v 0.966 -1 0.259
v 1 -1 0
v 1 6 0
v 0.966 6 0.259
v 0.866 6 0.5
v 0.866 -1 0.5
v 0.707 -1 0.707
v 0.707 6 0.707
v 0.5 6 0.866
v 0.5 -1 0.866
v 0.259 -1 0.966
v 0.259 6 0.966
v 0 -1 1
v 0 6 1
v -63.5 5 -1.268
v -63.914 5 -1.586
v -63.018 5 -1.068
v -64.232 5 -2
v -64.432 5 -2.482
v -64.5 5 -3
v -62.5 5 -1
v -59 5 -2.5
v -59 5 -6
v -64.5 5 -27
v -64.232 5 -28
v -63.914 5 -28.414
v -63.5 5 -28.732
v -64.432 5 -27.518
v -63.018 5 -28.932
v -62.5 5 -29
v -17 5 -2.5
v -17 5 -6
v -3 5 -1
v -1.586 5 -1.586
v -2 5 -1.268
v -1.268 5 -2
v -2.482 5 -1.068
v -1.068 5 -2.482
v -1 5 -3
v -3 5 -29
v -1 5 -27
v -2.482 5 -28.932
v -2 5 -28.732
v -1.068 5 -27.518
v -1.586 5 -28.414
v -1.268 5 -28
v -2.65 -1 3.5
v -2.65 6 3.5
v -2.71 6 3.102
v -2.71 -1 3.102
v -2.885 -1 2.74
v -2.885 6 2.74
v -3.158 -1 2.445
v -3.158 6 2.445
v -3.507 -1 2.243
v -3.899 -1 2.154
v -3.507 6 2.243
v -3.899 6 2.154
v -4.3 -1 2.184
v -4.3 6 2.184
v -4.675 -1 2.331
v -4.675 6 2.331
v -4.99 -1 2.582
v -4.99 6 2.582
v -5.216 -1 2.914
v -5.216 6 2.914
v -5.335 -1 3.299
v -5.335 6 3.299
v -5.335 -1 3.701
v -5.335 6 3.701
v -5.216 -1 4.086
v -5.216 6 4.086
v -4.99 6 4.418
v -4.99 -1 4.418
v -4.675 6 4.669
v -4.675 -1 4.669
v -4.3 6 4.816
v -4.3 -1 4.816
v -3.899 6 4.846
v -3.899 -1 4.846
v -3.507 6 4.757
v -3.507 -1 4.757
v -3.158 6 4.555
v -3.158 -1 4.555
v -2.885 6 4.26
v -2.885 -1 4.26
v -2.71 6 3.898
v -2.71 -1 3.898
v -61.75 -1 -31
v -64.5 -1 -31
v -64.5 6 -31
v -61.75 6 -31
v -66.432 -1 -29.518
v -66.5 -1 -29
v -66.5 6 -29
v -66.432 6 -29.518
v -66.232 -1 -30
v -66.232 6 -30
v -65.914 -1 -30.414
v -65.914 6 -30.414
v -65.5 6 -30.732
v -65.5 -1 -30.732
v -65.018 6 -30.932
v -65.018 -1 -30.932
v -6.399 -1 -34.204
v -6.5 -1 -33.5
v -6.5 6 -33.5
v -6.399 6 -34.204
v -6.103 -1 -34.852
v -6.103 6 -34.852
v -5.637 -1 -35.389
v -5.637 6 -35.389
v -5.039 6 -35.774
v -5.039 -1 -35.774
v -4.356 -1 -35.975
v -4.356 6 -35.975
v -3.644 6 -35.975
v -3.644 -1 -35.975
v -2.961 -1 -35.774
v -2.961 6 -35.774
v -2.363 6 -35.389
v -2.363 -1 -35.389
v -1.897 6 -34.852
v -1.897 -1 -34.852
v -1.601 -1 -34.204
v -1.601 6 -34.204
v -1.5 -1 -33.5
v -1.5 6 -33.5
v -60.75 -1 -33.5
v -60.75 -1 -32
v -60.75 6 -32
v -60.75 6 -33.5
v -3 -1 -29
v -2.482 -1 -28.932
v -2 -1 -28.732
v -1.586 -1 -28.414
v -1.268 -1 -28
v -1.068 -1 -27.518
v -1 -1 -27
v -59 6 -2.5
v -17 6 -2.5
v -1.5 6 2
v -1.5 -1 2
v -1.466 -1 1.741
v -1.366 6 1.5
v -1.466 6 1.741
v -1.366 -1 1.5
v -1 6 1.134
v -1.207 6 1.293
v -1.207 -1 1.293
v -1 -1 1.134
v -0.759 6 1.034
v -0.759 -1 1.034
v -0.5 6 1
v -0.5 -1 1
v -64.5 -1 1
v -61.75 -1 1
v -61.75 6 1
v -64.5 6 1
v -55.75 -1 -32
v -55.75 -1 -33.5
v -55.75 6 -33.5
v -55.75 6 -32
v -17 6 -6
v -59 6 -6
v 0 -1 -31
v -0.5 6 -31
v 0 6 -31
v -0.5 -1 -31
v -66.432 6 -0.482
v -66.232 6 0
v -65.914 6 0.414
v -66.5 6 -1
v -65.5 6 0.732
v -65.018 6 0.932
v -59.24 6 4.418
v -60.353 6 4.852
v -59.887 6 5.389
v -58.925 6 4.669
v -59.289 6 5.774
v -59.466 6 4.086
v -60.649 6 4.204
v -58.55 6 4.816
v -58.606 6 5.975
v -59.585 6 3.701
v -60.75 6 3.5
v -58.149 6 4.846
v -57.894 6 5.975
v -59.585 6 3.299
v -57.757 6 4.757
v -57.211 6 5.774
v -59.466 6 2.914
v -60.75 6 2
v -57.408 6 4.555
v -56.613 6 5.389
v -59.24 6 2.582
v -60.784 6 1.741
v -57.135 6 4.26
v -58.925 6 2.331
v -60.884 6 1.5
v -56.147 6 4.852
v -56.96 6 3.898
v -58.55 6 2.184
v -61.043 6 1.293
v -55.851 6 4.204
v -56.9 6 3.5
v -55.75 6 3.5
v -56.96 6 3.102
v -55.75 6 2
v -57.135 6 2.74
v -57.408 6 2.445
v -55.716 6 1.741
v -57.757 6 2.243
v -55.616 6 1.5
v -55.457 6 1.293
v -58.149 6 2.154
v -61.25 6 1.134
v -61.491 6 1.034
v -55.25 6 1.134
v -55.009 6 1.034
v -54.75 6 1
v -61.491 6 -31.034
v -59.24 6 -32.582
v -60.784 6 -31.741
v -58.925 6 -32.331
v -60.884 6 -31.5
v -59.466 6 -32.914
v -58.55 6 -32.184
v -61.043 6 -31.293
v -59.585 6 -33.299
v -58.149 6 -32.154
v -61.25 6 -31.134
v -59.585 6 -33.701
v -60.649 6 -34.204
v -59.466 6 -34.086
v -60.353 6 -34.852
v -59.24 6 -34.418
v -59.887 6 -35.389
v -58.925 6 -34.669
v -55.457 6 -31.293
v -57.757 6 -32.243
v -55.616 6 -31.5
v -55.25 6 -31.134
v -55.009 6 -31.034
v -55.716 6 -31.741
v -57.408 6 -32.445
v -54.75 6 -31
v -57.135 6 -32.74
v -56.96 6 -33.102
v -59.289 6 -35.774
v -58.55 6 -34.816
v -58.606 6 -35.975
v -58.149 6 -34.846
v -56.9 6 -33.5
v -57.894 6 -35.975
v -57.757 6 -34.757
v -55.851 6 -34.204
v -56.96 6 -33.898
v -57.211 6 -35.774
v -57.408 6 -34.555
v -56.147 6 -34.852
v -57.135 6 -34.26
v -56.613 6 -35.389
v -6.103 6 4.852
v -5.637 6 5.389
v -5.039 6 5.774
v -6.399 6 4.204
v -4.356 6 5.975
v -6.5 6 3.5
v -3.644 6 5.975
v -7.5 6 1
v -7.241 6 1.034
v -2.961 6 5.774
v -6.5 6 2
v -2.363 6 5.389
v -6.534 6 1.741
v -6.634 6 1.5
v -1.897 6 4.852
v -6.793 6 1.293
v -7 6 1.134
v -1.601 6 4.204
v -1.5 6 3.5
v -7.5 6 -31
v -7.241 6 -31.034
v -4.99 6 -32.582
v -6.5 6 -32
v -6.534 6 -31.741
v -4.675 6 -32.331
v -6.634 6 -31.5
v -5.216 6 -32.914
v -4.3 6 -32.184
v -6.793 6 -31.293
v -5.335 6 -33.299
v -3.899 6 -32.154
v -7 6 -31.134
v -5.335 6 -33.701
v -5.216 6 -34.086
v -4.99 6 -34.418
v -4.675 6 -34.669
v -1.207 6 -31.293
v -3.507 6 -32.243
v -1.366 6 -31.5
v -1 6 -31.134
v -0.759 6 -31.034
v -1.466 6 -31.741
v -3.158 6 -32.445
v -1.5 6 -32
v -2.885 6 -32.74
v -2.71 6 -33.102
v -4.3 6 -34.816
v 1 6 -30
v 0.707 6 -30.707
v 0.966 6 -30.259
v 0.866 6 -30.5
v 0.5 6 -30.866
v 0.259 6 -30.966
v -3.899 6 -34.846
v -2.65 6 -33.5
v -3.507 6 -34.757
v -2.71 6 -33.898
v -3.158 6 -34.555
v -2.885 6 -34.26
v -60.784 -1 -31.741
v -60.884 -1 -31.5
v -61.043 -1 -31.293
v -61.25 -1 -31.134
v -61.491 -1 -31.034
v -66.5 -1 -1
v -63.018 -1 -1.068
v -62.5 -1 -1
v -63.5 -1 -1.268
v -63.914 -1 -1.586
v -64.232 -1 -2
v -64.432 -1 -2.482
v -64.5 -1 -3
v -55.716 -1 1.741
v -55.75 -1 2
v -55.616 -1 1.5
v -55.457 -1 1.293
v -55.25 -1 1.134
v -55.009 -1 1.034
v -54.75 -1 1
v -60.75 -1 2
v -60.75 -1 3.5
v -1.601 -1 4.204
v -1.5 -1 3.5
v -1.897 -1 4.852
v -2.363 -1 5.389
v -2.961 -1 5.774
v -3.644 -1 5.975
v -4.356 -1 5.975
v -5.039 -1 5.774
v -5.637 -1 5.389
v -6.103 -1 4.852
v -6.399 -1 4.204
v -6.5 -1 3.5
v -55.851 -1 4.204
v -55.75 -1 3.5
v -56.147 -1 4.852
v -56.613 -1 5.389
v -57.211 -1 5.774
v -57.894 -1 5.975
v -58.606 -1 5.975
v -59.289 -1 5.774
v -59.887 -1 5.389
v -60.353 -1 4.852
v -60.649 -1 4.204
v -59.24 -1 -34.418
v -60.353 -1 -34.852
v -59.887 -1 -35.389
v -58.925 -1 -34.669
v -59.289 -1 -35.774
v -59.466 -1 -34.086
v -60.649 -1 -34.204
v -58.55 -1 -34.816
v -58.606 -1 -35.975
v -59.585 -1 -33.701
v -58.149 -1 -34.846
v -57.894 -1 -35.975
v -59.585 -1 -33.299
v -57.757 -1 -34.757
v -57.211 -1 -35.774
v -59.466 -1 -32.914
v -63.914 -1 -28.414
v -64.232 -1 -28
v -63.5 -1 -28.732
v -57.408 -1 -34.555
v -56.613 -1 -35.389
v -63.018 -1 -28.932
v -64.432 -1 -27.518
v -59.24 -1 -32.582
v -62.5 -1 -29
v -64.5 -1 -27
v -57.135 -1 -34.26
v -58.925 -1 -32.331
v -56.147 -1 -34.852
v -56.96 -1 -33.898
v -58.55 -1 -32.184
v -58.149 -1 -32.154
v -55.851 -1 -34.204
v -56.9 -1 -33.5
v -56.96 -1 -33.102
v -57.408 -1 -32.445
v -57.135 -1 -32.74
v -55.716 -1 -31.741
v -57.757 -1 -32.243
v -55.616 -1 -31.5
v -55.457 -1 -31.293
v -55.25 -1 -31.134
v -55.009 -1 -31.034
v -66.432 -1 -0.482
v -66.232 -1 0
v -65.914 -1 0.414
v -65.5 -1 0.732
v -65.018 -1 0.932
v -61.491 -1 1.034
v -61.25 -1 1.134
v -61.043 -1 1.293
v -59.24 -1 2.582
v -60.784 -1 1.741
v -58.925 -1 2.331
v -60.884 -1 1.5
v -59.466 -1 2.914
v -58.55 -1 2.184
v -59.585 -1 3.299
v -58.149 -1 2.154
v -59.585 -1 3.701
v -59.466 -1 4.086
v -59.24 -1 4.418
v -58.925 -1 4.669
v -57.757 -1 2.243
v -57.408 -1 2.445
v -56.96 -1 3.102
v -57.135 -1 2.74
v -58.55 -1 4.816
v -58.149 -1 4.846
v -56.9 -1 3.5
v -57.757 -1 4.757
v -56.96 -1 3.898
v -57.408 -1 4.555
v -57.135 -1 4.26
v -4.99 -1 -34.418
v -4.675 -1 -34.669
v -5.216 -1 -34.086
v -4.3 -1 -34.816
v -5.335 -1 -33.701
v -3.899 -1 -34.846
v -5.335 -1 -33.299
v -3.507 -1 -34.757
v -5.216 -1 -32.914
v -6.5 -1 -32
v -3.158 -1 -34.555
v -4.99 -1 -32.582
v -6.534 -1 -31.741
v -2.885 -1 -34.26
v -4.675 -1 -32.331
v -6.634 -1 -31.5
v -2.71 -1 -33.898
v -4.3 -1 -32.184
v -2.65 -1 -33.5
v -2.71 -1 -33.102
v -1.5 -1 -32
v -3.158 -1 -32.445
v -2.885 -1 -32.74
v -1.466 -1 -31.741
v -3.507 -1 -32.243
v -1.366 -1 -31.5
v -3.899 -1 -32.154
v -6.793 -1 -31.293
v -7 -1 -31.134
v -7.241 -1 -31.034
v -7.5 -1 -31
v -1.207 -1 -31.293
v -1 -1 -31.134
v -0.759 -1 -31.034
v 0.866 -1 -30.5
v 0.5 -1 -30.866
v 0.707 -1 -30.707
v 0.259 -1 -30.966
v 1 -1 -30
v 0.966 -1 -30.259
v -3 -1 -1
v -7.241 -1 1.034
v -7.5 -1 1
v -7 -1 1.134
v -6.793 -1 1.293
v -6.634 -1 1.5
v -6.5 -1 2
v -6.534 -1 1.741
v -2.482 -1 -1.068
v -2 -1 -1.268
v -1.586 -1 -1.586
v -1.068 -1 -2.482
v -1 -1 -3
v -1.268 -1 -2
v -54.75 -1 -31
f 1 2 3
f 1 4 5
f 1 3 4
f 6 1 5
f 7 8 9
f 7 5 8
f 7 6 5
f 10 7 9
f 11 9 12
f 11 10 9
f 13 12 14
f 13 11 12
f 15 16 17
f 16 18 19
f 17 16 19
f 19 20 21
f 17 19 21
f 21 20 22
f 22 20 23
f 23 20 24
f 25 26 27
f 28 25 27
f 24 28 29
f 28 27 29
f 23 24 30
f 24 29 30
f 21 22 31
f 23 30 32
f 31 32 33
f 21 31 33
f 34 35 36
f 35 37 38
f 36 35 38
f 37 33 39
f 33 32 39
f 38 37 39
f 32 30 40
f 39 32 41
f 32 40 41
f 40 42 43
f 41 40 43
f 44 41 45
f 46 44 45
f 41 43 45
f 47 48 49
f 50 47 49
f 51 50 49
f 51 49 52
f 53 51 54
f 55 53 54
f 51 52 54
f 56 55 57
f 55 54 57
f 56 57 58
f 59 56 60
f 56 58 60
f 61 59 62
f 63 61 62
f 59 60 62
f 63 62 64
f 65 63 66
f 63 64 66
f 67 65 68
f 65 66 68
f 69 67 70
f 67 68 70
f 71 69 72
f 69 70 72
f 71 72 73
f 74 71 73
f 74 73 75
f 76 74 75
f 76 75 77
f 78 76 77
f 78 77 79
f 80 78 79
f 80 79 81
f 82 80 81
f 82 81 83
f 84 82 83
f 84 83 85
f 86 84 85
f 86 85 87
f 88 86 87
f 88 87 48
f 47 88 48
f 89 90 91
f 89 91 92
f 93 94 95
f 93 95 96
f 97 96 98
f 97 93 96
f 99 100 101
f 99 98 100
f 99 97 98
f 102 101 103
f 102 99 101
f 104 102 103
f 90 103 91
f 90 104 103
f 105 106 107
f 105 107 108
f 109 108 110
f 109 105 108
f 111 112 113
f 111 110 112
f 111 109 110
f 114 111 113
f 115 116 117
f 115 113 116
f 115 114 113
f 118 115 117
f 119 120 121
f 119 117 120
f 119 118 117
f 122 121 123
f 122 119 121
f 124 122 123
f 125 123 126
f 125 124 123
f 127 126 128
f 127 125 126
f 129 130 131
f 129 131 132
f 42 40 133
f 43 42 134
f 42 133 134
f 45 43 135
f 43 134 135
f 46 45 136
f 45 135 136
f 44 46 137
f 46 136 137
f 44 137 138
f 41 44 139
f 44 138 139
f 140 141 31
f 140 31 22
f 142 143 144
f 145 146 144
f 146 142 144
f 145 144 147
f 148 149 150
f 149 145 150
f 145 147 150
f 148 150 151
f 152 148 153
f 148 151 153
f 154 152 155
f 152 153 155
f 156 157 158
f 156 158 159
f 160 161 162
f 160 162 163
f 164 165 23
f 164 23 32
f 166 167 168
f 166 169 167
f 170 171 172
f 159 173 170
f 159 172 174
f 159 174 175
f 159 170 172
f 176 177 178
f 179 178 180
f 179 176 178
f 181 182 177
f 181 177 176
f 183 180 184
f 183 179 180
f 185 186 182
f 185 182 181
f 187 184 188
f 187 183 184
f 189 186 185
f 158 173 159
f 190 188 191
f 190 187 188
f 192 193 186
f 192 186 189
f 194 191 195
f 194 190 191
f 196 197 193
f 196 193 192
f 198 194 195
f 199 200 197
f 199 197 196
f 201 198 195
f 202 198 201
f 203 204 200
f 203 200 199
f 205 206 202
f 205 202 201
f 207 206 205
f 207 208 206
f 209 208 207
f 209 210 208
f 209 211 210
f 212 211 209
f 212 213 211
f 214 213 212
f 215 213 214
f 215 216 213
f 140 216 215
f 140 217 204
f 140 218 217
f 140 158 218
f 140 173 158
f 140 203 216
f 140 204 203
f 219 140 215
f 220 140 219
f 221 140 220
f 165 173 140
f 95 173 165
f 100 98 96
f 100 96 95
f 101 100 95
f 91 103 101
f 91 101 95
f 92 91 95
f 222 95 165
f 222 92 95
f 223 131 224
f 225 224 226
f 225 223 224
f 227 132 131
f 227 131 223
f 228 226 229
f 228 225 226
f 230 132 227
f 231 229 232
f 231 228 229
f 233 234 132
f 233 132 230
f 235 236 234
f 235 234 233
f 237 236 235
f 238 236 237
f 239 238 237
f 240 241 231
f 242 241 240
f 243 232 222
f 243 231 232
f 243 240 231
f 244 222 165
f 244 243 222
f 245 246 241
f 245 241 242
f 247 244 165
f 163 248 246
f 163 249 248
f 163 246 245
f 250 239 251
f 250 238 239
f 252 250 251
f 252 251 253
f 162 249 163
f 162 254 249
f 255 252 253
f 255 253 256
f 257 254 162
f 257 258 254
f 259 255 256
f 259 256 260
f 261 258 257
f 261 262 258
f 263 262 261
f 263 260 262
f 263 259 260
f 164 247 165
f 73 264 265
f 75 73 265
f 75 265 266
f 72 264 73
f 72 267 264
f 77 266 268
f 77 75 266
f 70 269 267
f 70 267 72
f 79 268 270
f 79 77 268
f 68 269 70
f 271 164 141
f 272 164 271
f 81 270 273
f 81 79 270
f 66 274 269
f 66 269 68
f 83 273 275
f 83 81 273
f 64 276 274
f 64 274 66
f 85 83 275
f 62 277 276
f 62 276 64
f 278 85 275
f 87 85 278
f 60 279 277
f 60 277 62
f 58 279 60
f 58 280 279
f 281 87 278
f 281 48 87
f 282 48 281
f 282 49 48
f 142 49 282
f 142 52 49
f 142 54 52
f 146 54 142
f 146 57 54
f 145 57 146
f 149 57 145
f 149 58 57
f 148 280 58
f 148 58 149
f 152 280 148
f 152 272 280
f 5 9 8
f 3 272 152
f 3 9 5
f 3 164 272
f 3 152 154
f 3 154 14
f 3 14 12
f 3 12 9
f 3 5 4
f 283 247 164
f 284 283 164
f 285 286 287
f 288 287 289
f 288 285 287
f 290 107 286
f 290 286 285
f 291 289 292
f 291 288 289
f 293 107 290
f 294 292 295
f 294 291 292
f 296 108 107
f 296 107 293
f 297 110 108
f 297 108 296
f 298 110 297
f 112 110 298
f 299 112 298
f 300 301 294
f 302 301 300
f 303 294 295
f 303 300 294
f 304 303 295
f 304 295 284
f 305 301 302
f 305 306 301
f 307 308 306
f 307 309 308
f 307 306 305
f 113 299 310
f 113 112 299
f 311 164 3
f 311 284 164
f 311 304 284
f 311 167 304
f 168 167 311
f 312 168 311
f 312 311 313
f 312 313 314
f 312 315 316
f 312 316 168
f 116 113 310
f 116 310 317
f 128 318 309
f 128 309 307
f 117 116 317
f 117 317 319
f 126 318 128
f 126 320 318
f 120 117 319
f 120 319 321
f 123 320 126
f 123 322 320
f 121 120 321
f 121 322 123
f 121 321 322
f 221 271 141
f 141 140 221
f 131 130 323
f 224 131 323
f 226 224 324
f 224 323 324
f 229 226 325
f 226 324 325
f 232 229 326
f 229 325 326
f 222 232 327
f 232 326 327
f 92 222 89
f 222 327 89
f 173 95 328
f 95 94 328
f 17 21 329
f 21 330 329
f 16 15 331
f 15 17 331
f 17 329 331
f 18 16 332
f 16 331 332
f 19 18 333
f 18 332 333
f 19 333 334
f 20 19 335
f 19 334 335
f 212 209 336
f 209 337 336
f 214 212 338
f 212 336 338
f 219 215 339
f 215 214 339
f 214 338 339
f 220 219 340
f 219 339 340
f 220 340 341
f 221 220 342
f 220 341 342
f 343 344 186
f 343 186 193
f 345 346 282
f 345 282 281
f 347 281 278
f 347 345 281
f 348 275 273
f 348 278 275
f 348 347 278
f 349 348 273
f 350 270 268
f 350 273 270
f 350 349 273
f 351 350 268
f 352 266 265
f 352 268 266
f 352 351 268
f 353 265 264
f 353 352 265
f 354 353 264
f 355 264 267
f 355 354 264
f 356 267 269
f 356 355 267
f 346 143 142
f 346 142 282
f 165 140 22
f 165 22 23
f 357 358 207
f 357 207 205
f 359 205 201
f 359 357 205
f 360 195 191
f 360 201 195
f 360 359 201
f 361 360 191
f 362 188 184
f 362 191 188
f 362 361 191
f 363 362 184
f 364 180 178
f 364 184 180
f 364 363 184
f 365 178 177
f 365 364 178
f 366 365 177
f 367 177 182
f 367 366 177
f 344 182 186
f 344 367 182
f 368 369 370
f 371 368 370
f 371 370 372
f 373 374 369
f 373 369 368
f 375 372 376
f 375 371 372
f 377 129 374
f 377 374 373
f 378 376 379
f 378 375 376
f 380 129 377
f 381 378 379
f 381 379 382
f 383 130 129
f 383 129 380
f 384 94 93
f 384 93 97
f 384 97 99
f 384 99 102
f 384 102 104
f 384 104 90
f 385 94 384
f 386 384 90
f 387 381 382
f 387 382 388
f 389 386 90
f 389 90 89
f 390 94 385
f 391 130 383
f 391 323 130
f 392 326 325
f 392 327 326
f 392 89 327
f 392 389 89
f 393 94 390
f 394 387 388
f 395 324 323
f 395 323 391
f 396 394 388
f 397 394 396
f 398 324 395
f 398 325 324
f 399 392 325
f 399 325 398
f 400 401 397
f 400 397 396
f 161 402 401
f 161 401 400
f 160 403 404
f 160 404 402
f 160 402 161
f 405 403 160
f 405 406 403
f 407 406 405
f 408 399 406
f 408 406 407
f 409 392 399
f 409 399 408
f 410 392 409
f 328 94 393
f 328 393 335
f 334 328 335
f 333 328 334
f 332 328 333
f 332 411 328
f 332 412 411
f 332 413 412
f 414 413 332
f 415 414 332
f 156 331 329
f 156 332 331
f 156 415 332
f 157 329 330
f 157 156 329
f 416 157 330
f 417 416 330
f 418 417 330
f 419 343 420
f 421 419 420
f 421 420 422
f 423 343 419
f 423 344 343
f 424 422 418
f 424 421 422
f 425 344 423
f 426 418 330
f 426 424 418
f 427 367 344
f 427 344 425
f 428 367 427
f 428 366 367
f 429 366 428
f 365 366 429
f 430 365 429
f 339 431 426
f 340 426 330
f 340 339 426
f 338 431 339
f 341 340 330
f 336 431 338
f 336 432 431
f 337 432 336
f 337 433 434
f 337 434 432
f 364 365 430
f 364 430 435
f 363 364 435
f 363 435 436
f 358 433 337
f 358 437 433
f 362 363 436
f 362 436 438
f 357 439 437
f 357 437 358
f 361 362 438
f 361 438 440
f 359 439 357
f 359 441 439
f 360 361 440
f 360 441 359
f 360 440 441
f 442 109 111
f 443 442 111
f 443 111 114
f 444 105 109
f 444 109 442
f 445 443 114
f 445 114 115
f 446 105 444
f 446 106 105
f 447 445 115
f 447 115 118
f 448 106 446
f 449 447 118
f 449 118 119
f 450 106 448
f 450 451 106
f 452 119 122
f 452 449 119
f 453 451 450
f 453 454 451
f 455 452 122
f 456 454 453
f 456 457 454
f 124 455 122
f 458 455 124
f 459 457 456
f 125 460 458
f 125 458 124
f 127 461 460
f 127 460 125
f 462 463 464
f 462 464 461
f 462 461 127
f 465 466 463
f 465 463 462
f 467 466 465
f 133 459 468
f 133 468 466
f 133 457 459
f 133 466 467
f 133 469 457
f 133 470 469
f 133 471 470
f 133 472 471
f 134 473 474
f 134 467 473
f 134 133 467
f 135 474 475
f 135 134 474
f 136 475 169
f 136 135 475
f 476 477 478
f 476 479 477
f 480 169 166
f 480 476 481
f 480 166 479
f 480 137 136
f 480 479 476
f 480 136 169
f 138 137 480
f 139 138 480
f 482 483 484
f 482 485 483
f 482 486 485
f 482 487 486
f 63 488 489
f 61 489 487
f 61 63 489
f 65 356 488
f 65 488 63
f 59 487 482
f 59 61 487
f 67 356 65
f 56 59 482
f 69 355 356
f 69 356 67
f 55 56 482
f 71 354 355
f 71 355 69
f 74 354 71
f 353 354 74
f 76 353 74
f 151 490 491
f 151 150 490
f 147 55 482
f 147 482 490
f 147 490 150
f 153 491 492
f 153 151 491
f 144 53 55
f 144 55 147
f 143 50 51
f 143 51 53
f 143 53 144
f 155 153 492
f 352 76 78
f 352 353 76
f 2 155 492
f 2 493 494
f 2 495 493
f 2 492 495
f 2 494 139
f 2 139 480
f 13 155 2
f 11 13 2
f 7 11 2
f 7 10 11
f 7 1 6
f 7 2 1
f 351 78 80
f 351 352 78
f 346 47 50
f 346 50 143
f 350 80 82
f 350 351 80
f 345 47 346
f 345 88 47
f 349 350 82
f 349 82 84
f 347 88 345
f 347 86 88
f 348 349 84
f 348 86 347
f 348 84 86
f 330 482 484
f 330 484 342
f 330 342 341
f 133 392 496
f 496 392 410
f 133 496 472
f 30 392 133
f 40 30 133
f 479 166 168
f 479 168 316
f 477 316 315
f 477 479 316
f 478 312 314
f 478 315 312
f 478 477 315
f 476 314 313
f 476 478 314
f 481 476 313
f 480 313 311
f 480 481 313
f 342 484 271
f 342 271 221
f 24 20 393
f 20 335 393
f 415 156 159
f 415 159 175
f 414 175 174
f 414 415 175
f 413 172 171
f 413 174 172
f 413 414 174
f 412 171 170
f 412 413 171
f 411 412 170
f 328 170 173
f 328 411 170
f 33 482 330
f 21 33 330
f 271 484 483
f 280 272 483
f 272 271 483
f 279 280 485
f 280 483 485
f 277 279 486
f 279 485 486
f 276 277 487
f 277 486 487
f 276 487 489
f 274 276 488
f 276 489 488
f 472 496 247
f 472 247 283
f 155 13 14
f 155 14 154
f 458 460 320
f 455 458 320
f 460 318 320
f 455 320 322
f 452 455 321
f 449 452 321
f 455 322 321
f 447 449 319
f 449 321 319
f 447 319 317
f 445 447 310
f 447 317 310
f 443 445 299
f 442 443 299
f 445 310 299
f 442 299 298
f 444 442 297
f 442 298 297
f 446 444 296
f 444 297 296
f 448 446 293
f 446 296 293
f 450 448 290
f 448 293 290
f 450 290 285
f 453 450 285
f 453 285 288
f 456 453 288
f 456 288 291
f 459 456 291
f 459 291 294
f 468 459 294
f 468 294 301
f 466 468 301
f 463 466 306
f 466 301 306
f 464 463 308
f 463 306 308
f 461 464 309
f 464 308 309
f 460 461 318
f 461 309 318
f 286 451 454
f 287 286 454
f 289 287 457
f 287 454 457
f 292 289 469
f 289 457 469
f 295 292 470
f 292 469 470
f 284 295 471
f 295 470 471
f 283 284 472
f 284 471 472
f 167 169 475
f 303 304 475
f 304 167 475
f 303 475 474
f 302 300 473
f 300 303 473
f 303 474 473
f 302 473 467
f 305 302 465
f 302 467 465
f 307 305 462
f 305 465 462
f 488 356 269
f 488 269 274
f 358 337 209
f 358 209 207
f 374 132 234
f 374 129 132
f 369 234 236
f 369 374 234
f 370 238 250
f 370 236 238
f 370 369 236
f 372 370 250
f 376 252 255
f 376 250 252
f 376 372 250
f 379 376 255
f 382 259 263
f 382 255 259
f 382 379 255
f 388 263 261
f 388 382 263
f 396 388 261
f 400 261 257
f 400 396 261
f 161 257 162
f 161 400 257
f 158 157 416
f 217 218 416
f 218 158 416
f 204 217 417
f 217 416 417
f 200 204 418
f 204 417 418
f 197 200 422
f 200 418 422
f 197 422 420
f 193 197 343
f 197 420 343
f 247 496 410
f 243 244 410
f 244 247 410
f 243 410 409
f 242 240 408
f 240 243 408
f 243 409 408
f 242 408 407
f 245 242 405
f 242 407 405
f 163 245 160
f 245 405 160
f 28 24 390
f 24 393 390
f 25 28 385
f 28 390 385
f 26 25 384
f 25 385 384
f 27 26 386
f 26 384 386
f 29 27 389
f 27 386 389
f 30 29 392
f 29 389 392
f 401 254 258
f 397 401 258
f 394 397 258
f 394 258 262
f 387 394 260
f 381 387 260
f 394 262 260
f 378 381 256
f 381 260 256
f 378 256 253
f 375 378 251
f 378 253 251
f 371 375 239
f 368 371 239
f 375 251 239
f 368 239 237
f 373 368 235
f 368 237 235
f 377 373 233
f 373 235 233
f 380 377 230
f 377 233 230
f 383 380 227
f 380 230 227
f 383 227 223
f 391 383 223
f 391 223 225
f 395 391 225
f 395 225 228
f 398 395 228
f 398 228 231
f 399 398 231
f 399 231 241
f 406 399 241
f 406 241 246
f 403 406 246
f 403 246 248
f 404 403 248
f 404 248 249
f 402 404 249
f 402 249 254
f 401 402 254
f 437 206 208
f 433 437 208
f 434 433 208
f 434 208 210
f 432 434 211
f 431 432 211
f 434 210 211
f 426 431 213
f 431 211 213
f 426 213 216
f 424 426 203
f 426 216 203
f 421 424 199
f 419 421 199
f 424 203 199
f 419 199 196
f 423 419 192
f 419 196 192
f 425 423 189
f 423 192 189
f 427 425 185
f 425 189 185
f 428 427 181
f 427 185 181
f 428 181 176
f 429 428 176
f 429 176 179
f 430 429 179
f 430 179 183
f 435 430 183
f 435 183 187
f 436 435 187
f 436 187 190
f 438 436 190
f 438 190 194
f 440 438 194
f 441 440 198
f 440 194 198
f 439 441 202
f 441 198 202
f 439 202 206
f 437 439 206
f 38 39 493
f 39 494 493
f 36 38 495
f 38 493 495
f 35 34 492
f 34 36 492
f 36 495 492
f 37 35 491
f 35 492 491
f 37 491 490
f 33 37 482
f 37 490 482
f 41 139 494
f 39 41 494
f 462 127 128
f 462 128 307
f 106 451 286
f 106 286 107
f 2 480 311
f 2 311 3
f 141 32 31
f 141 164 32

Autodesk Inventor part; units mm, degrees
ref_plane "YZ Plane" through (0, 0, 0) normal (1, 0, 0) x (0, 1, 0)
ref_plane "XZ Plane" through (0, 0, 0) normal (0, 1, 0) x (-1, 0, 0)
ref_plane "XY Plane" through (0, 0, 0) normal (0, 0, 1) x (1, 0, 0)
sketch "Sketch1" plane through (0, 0, 0) normal (0, 1, 0) x (-1, 0, 0)
  line L0 (0, 0) -> (37, 0) construction
  line L1 (37, 0) -> (37, -30) construction
  line L2 (37, -30) -> (0, -30) construction
  line L3 (0, -30) -> (0, 0) construction
  line L4 (75.5, -6) -> (38, -6) construction
  line L5 (38, -6) -> (38, -24) construction
  line L6 (38, -24) -> (75.5, -24) construction
  line L7 (75.5, -24) -> (75.5, -6) construction
  line L8 (94, 0) -> (76.5, 0) construction
  line L9 (76.5, 0) -> (76.5, -28) construction
  line L10 (76.5, -28) -> (94, -28) construction
  line L11 (94, -28) -> (94, 0) construction
  line L12 (-1, 1) -> (117.5, 1)
  line L13 (117.5, 1) -> (117.5, -31)
  line L14 (117.5, -31) -> (-1, -31)
  line L15 (-1, -31) -> (-1, 1)
  line L16 (0, 0) -> (94, 0)
  line L17 (94, 0) -> (94, -30)
  line L18 (94, -30) -> (0, -30)
  line L19 (0, -30) -> (0, 0)
  line L20 (38, -8) -> (37, -8)
  line L21 (37, -8) -> (37, -22)
  line L22 (37, -22) -> (38, -22)
  line L23 (38, -22) -> (38, -8)
  line L24 (73.5, -6) -> (40, -6)
  line L25 (40, -6) -> (40, -5)
  line L26 (40, -5) -> (73.5, -5)
  line L27 (73.5, -5) -> (73.5, -6)
  line L28 (73.5, -24) -> (40, -24)
  line L29 (40, -24) -> (40, -25)
  line L30 (40, -25) -> (73.5, -25)
  line L31 (73.5, -25) -> (73.5, -24)
  line L32 (76.5, -8) -> (75.5, -8)
  line L33 (75.5, -8) -> (75.5, -22)
  line L34 (75.5, -22) -> (76.5, -22)
  line L35 (76.5, -22) -> (76.5, -8)
  line L36 (115, -31) -> (115, -33.5) construction
  line L37 (58.25, -31) -> (58.25, -33.5) construction
  line L38 (4, -31) -> (4, -33.5) construction
  line L39 (115, 1) -> (115, 3.5) construction
  line L40 (58.25, 1) -> (58.25, 3.5) construction
  line L41 (4, 1) -> (4, 3.5) construction
  circle A0 centre (115, -33.5) radius 2.5
  circle A1 centre (58.25, -33.5) radius 2.5
  circle A2 centre (4, -33.5) radius 2.5
  circle A3 centre (4, 3.5) radius 2.5
  circle A4 centre (58.25, 3.5) radius 2.5
  circle A5 centre (115, 3.5) radius 2.5
  line L42 (117.5, 1) -> (117.5, 3.5)
  line L43 (112.5, 3.5) -> (112.5, 1)
  line L44 (60.75, 3.5) -> (60.75, 1)
  line L45 (55.75, 3.5) -> (55.75, 1)
  line L46 (6.5, 3.5) -> (6.5, 1)
  line L47 (1.5, 3.5) -> (1.5, 1)
  line L48 (1.5, -33.5) -> (1.5, -31)
  line L49 (6.5, -33.5) -> (6.5, -31)
  line L50 (55.75, -33.5) -> (55.75, -31)
  line L51 (60.75, -33.5) -> (60.75, -31)
  line L52 (117.5, -33.5) -> (117.5, -31)
  line L53 (112.5, -33.5) -> (112.5, -31)
  circle A6 centre (115, -33.5) radius 1.55
  circle A7 centre (58.25, -33.5) radius 1.55
  circle A8 centre (4, -33.5) radius 1.55
  circle A9 centre (4, 3.5) radius 1.55
  circle A10 centre (58.25, 3.5) radius 1.55
  circle A11 centre (115, 3.5) radius 1.55
  line L54 (57.75, -30) -> (58.75, -30)
  line L55 (58.75, -30) -> (58.75, -25)
  line L56 (58.75, -25) -> (57.75, -25)
  line L57 (57.75, -25) -> (57.75, -30)
  line L58 (57.75, -5) -> (58.75, -5)
  line L59 (58.75, -5) -> (58.75, 0)
  line L60 (58.75, 0) -> (57.75, 0)
  line L61 (57.75, 0) -> (57.75, -5)
  line L62 (40, -25) -> (41, -25)
  line L63 (41, -25) -> (41, -30)
  line L64 (41, -30) -> (40, -30)
  line L65 (40, -30) -> (40, -25)
  line L66 (40, -5) -> (41, -5)
  line L67 (41, -5) -> (41, 0)
  line L68 (41, 0) -> (40, 0)
  line L69 (40, 0) -> (40, -5)
  line L70 (73.5, -5) -> (72.5, -5)
  line L71 (72.5, -5) -> (72.5, 0)
  line L72 (72.5, 0) -> (73.5, 0)
  line L73 (73.5, 0) -> (73.5, -5)
  line L74 (73.5, -25) -> (72.5, -25)
  line L75 (72.5, -25) -> (72.5, -30)
  line L76 (72.5, -30) -> (73.5, -30)
  line L77 (73.5, -30) -> (73.5, -25)
  dimension "d0" = 37
  dimension "d1" = 30
  dimension "d2" = 18
  dimension "d3" = 37.5
  dimension "d4" = 1
  dimension "d5" = 6
  dimension "d6" = 17.5
  dimension "d7" = 28
  dimension "d8" = 1
  dimension "d9" = 1
  dimension "d10" = 1
  dimension "d11" = 1
  dimension "d12" = 117.5
  dimension "d13" = 2
  dimension "d14" = 2
  dimension "d15" = 1
  dimension "d16" = 1
  dimension "d17" = 2
  dimension "d18" = 2
  dimension "d19" = 2
  dimension "d20" = 2
  dimension "d21" = 2.5
  dimension "d22" = 2.5
  dimension "d23" = 5
  dimension "d24" = 2.5
  dimension "d25" = 2.5
  dimension "d26" = 2.5
  dimension "d27" = 2.5
  dimension "d28" = 5
  dimension "d29" = 5
  dimension "d30" = 2.5
  dimension "d31" = 3.1
  dimension "d32" = 3.1
  dimension "d33" = 3.1
  dimension "d34" = 3.1
  dimension "d35" = 3.1
  dimension "d36" = 3.1
  dimension "d44" = 1
  dimension "d45" = 1
  dimension "d46" = 0.5
  dimension "d47" = 0
  dimension "d48" = 1
  dimension "d49" = 1
  dimension "d50" = 1
  dimension "d51" = 1
extrude "Extrusion1" add sketch "Sketch1" along normal blind 7 contours L12 L13 L14 L15 | L47 A3 L12 | A3 L46 L12 | A3 | L14 A2 L48 | L14 L49 A2 | A2 | L45 A4 L12 | A4 L44 L12 | A4 | L14 A1 L50 | L14 L51 A1 | A1 | L43 A5 L12 | A5 L42 L12 | A5 | L14 A0 L53 | L14 L52 A0 | A0 | L16 L67 L26 L69 | L26 L27 L24 L25 | L65 L30 L63 L18 | L16 L59 L26 L61 | L29 L28 L31 L30 | L57 L30 L55 L18 | L16 L73 L26 L71 | L75 L30 L77 L18 | L23 L22 L21 L20 | L35 L34 L33 L32
sketch "Sketch2" plane through (0, 0, 0) normal (0, -1, 0) x (1, 0, 0)
  line L0 (-117.5, -33.5) -> (-117.5, 3.5) projected
  arc A0 (-117.5, -33.5) -> (-112.5, -33.5) centre (-115, -33.5) ccw projected
  line L1 (-112.5, -31) -> (-112.5, -33.5) projected
  line L2 (-60.75, -31) -> (-112.5, -31) projected
  line L3 (-60.75, -33.5) -> (-60.75, -31) projected
  arc A1 (-60.75, -33.5) -> (-55.75, -33.5) centre (-58.25, -33.5) ccw projected
  line L4 (-55.75, -31) -> (-55.75, -33.5) projected
  line L5 (-6.5, -31) -> (-55.75, -31) projected
  line L6 (-6.5, -33.5) -> (-6.5, -31) projected
  arc A2 (-6.5, -33.5) -> (-1.5, -33.5) centre (-4, -33.5) ccw projected
  line L7 (-1.5, -31) -> (-1.5, -33.5) projected
  line L8 (1, -31) -> (-1.5, -31) projected
  line L9 (1, 1) -> (1, -31) projected
  line L10 (-1.5, 1) -> (1, 1) projected
  line L11 (-1.5, 3.5) -> (-1.5, 1) projected
  arc A3 (-1.5, 3.5) -> (-6.5, 3.5) centre (-4, 3.5) ccw projected
  line L12 (-6.5, 1) -> (-6.5, 3.5) projected
  line L13 (-55.75, 1) -> (-6.5, 1) projected
  line L14 (-55.75, 3.5) -> (-55.75, 1) projected
  arc A4 (-55.75, 3.5) -> (-60.75, 3.5) centre (-58.25, 3.5) ccw projected
  line L15 (-60.75, 1) -> (-60.75, 3.5) projected
  line L16 (-112.5, 1) -> (-60.75, 1) projected
  line L17 (-112.5, 3.5) -> (-112.5, 1) projected
  arc A5 (-112.5, 3.5) -> (-117.5, 3.5) centre (-115, 3.5) ccw projected
  circle A6 centre (-58.25, 3.5) radius 1.55 projected
  circle A7 centre (-4, 3.5) radius 1.55 projected
  circle A8 centre (-4, -33.5) radius 1.55 projected
  circle A9 centre (-58.25, -33.5) radius 1.55 projected
  circle A10 centre (-115, 3.5) radius 1.55 projected
  circle A11 centre (-115, -33.5) radius 1.55 projected
  line L18 (-41, 0) -> (-57.75, 0) projected
  line L19 (0, -30) -> (0, 0) projected
  line L20 (-57.75, -30) -> (-41, -30) projected
  line L21 (-94, 0) -> (-94, -30) projected
  line L22 (-41, -5) -> (-41, 0) projected
  line L23 (-57.75, -5) -> (-41, -5) projected
  line L24 (-57.75, 0) -> (-57.75, -5) projected
  line L25 (-41, -30) -> (-41, -25) projected
  line L26 (-57.75, -25) -> (-57.75, -30) projected
  line L27 (-41, -25) -> (-57.75, -25) projected
  line L28 (-72.5, -25) -> (-72.5, -30) projected
  line L29 (-58.75, -25) -> (-72.5, -25) projected
  line L30 (-58.75, -30) -> (-58.75, -25) projected
  line L31 (-72.5, -30) -> (-58.75, -30) projected
  line L32 (-72.5, 0) -> (-72.5, -5) projected
  line L33 (-58.75, 0) -> (-72.5, 0) projected
  line L34 (-58.75, -5) -> (-58.75, 0) projected
  line L35 (-72.5, -5) -> (-58.75, -5) projected
  line L36 (-73.5, 0) -> (-94, 0) projected
  line L37 (-73.5, -6) -> (-73.5, 0) projected
  line L38 (-40, -6) -> (-73.5, -6) projected
  line L39 (-40, 0) -> (-40, -6) projected
  line L40 (0, 0) -> (-40, 0) projected
  line L41 (-40, -30) -> (0, -30) projected
  line L42 (-40, -24) -> (-40, -30) projected
  line L43 (-73.5, -24) -> (-40, -24) projected
  line L44 (-73.5, -30) -> (-73.5, -24) projected
  line L45 (-94, -30) -> (-73.5, -30) projected
extrude "Extrusion2" add sketch "Sketch2" along normal blind 1 contours L0 A5 L17 L16 L15 A4 L14 L13 L12 A3 L11 L10 L9 L8 L7 A2 L6 L5 L4 A1 L3 L2 L1 A0 | L22 L23 L24 L18 | L41 L42 L43 L44 L45 L21 L36 L37 L38 L39 L40 L19 | L26 L27 L25 L20 | L29 L30 L31 L28 | L33 L34 L35 L32
fillet "Fillet2" radius 1 32 edges at (-73.5, 3.5, -6) (-73.5, 3.5, -24) (-40, 3.5, -24) (1, 3, -31) (-1.5, 3, -31) (1, 3, 1) (-55.75, 3, -31) (-1.5, 3, 1) (-55.75, 3, 1) (-112.5, 3, 1) (-112.5, 3, -31) (-60.75, 3, -31) (-6.5, 3, -31) (-60.75, 3, 1) (-6.5, 3, 1) (-40, 3.5, -6) (-72.5, 3.5, 0) (-57.75, 3.5, 0) (-72.5, 3.5, -25) (-57.75, 3.5, -25) (-41, 3.5, -25) (-58.75, 3.5, -25) (-41, 3.5, 0) (-58.75, 3.5, 0) (-72.5, 3.5, -30) (-57.75, 3.5, -30) (-57.75, 3.5, -5) (-72.5, 3.5, -5) (-41, 3.5, -5) (-58.75, 3.5, -5) (-58.75, 3.5, -30) (-41, 3.5, -30)
sketch "Sketch5" plane through (0, 7, 0) normal (0, 1, 0) x (1, 0, 0)
  line L0 (-120.447, 38.9055) -> (3.6698, 38.9055)
  line L1 (3.6698, 38.9055) -> (3.6698, -10.7705)
  line L2 (3.6698, -10.7705) -> (-120.447, -10.7705)
  line L3 (-120.447, -10.7705) -> (-120.447, 38.9055)
  point P0 (0, 0)
extrude "Extrusion5" cut sketch "Sketch5" against normal blind 7
sketch "Sketch13" plane through (0, 0, 0) normal (0, 1, 0) x (1, 0, 0)
  line L0 (-64.5, 29) -> (-1, 29)
  line L1 (-1, 29) -> (-1, 1)
  line L2 (-1, 1) -> (-64.5, 1)
  line L3 (-64.5, 1) -> (-64.5, 29)
  line L4 (1, 30) -> (1, 0) projected
  line L5 (-54.75, 31) -> (-7.5, 31) projected
  line L6 (-7.5, -1) -> (-54.75, -1) projected
  line L7 (-117.5, -3.5) -> (-117.5, 33.5) projected
  line L8 (-77.5, 28.5) -> (-67.5, 28.5)
  line L9 (-67.5, 28.5) -> (-67.5, 21.5)
  line L10 (-67.5, 21.5) -> (-77.5, 21.5)
  line L11 (-77.5, 21.5) -> (-77.5, 28.5)
  line L12 (-77.5, 11) -> (-67.5, 11)
  line L13 (-67.5, 11) -> (-67.5, 4)
  line L14 (-67.5, 4) -> (-77.5, 4)
  line L15 (-77.5, 4) -> (-77.5, 11)
  line L16 (-111.5, 31) -> (-61.75, 31) projected
  line L17 (-61.75, -1) -> (-111.5, -1) projected
  point P0 (0, 0)
  point P1 (-77.5, 25)
  point P2 (-77.5, 7.5)
  point P3 (-67.5, 25)
  point P4 (-67.5, 7.5)
  dimension "d114" = 2
  dimension "d115" = 2
  dimension "d116" = 2
  dimension "d117" = 53
  dimension "d118" = 50
  dimension "d119" = 10
  dimension "d120" = 2.5
  dimension "d121" = 5
  dimension "d122" = 12
  dimension "d123" = 9.5
extrude "Extrusion15" cut sketch "Sketch13" against normal through all
fillet "Fillet4" radius 2 12 edges at (-64.5, -0.5, -29) (-77.5, -0.5, -28.5) (-77.5, -0.5, -11) (-1, -0.5, -29) (-1, -0.5, -1) (-67.5, -0.5, -4) (-67.5, -0.5, -21.5) (-64.5, -0.5, -1) (-77.5, -0.5, -4) (-77.5, -0.5, -21.5) (-67.5, -0.5, -28.5) (-67.5, -0.5, -11)
sketch "Sketch14" plane through (0, 0, 0) normal (0, 1, 0) x (1, 0, 0)
  line L0 (-122.4495, 38.8167) -> (-66.5, 38.8167)
  line L1 (-66.5, 38.8167) -> (-66.5, -7.5012)
  line L2 (-66.5, -7.5012) -> (-122.4495, -7.5012)
  line L3 (-122.4495, -7.5012) -> (-122.4495, 38.8167)
  line L4 (-64.5, 3) -> (-64.5, 27) projected
  point P0 (0, 0)
  dimension "d127" = 2
extrude "Extrusion16" cut sketch "Sketch14" against normal blind 10
fillet "Fillet5" radius 2 2 edges at (-66.5, -0.5, 1) (-66.5, -0.5, -31)
sketch "Sketch15" plane through (0, -1, 0) normal (0, -1, 0) x (1, 0, 0)
  point P0 (0, 0)
sketch "Sketch16" plane through (0, 0, 0) normal (0, 1, 0) x (1, 0, 0)
  arc A0 (-64.5, 31) -> (-66.5, 29) centre (-64.5, 29) ccw projected
  line L0 (-66.5, 29) -> (-66.5, 1) projected
  arc A1 (-66.5, 1) -> (-64.5, -1) centre (-64.5, 1) ccw projected
  line L1 (-61.75, -1) -> (-64.5, -1) projected
  arc A2 (-60.75, -2) -> (-61.75, -1) centre (-61.75, -2) ccw projected
  line L2 (-60.75, -3.5) -> (-60.75, -2) projected
  arc A3 (-60.75, -3.5) -> (-55.75, -3.5) centre (-58.25, -3.5) ccw projected
  line L3 (-55.75, -2) -> (-55.75, -3.5) projected
  arc A4 (-54.75, -1) -> (-55.75, -2) centre (-54.75, -2) ccw projected
  line L4 (-7.5, -1) -> (-54.75, -1) projected
  arc A5 (-6.5, -2) -> (-7.5, -1) centre (-7.5, -2) ccw projected
  line L5 (-6.5, -3.5) -> (-6.5, -2) projected
  arc A6 (-6.5, -3.5) -> (-1.5, -3.5) centre (-4, -3.5) ccw projected
  line L6 (-1.5, -2) -> (-1.5, -3.5) projected
  arc A7 (-0.5, -1) -> (-1.5, -2) centre (-0.5, -2) ccw projected
  line L7 (0, -1) -> (-0.5, -1) projected
  arc A8 (0, -1) -> (1, 0) centre (0, 0) ccw projected
  line L8 (1, 30) -> (1, 0) projected
  arc A9 (1, 30) -> (0, 31) centre (0, 30) ccw projected
  line L9 (-0.5, 31) -> (0, 31) projected
  arc A10 (-1.5, 32) -> (-0.5, 31) centre (-0.5, 32) ccw projected
  line L10 (-1.5, 33.5) -> (-1.5, 32) projected
  arc A11 (-1.5, 33.5) -> (-6.5, 33.5) centre (-4, 33.5) ccw projected
  line L11 (-6.5, 32) -> (-6.5, 33.5) projected
  arc A12 (-7.5, 31) -> (-6.5, 32) centre (-7.5, 32) ccw projected
  line L12 (-54.75, 31) -> (-7.5, 31) projected
  arc A13 (-55.75, 32) -> (-54.75, 31) centre (-54.75, 32) ccw projected
  line L13 (-55.75, 33.5) -> (-55.75, 32) projected
  arc A14 (-55.75, 33.5) -> (-60.75, 33.5) centre (-58.25, 33.5) ccw projected
  line L14 (-60.75, 32) -> (-60.75, 33.5) projected
  arc A15 (-61.75, 31) -> (-60.75, 32) centre (-61.75, 32) ccw projected
  line L15 (-64.5, 31) -> (-61.75, 31) projected
  circle A16 centre (-58.25, 33.5) radius 1.55 projected
  circle A17 centre (-4, 33.5) radius 1.55 projected
  circle A18 centre (-4, -3.5) radius 1.55 projected
  circle A19 centre (-58.25, -3.5) radius 1.55 projected
  line L16 (-1, 27) -> (-1, 3) projected
  arc A20 (-3, 1) -> (-1, 3) centre (-3, 3) ccw projected
  line L17 (-3, 1) -> (-62.5, 1) projected
  arc A21 (-64.5, 3) -> (-62.5, 1) centre (-62.5, 3) ccw projected
  line L18 (-64.5, 3) -> (-64.5, 27) projected
  arc A22 (-62.5, 29) -> (-64.5, 27) centre (-62.5, 27) ccw projected
  line L19 (-62.5, 29) -> (-3, 29) projected
  arc A23 (-1, 27) -> (-3, 29) centre (-3, 27) ccw projected
  point P0 (0, 0)
extrude "Extrusion17" add sketch "Sketch16" along normal blind 5
sketch "Sketch17" plane through (0, 5, 0) normal (0, 1, 0) x (1, 0, 0)
  arc A0 (-64.5, 31) -> (-66.5, 29) centre (-64.5, 29) ccw projected
  line L0 (-66.5, 29) -> (-66.5, 1) projected
  arc A1 (-66.5, 1) -> (-64.5, -1) centre (-64.5, 1) ccw projected
  line L1 (-64.5, -1) -> (-61.75, -1) projected
  arc A2 (-60.75, -2) -> (-61.75, -1) centre (-61.75, -2) ccw projected
  line L2 (-60.75, -2) -> (-60.75, -3.5) projected
  arc A3 (-60.75, -3.5) -> (-55.75, -3.5) centre (-58.25, -3.5) ccw projected
  line L3 (-55.75, -3.5) -> (-55.75, -2) projected
  arc A4 (-54.75, -1) -> (-55.75, -2) centre (-54.75, -2) ccw projected
  line L4 (-54.75, -1) -> (-7.5, -1) projected
  arc A5 (-6.5, -2) -> (-7.5, -1) centre (-7.5, -2) ccw projected
  line L5 (-6.5, -2) -> (-6.5, -3.5) projected
  arc A6 (-6.5, -3.5) -> (-1.5, -3.5) centre (-4, -3.5) ccw projected
  line L6 (-1.5, -3.5) -> (-1.5, -2) projected
  arc A7 (-0.5, -1) -> (-1.5, -2) centre (-0.5, -2) ccw projected
  line L7 (-0.5, -1) -> (0, -1) projected
  arc A8 (0, -1) -> (1, 0) centre (0, 0) ccw projected
  line L8 (1, 0) -> (1, 30) projected
  arc A9 (1, 30) -> (0, 31) centre (0, 30) ccw projected
  line L9 (0, 31) -> (-0.5, 31) projected
  arc A10 (-1.5, 32) -> (-0.5, 31) centre (-0.5, 32) ccw projected
  line L10 (-1.5, 32) -> (-1.5, 33.5) projected
  arc A11 (-1.5, 33.5) -> (-6.5, 33.5) centre (-4, 33.5) ccw projected
  line L11 (-6.5, 33.5) -> (-6.5, 32) projected
  arc A12 (-7.5, 31) -> (-6.5, 32) centre (-7.5, 32) ccw projected
  line L12 (-7.5, 31) -> (-54.75, 31) projected
  arc A13 (-55.75, 32) -> (-54.75, 31) centre (-54.75, 32) ccw projected
  line L13 (-55.75, 32) -> (-55.75, 33.5) projected
  arc A14 (-55.75, 33.5) -> (-60.75, 33.5) centre (-58.25, 33.5) ccw projected
  line L14 (-60.75, 33.5) -> (-60.75, 32) projected
  arc A15 (-61.75, 31) -> (-60.75, 32) centre (-61.75, 32) ccw projected
  line L15 (-61.75, 31) -> (-64.5, 31) projected
  line L16 (-62.5, 29) -> (-3, 29) projected
  arc A16 (-1, 27) -> (-3, 29) centre (-3, 27) ccw projected
  line L17 (-1, 27) -> (-1, 3) projected
  arc A17 (-3, 1) -> (-1, 3) centre (-3, 3) ccw projected
  line L18 (-3, 1) -> (-62.5, 1) projected
  arc A18 (-64.5, 3) -> (-62.5, 1) centre (-62.5, 3) ccw projected
  line L19 (-64.5, 3) -> (-64.5, 27) projected
  arc A19 (-62.5, 29) -> (-64.5, 27) centre (-62.5, 27) ccw projected
  circle A20 centre (-58.25, -3.5) radius 1.55 projected
  circle A21 centre (-4, -3.5) radius 1.55 projected
  circle A22 centre (-4, 33.5) radius 1.55 projected
  circle A23 centre (-58.25, 33.5) radius 1.55 projected
  point P0 (0, 0)
extrude "Extrusion18" add sketch "Sketch17" along normal blind 1 contours L15 A15 L14 A14 L13 A13 L12 A12 L11 A11 L10 A10 L9 A9 L8 A8 L7 A7 L6 A6 L5 A5 L4 A4 L3 A3 L2 A2 L1 A1 L0 A0 | L16 A16 L17 A17 L18 A18 L19 A19
sketch "Sketch18" plane through (0, 6, 0) normal (0, 1, 0) x (1, 0, 0)
  line L0 (-59, 6) -> (-17, 6)
  line L1 (-17, 6) -> (-17, 2.5)
  line L2 (-17, 2.5) -> (-59, 2.5)
  line L3 (-59, 2.5) -> (-59, 6)
  circle A0 centre (-4, -3.5) radius 1.55 projected
  circle A1 centre (-58.25, -3.5) radius 1.55 projected
  circle A2 centre (-4, 33.5) radius 1.55 projected
  line L4 (-54.75, -1) -> (-7.5, -1) projected
  line L5 (-66.5, 29) -> (-66.5, 1) projected
  line L6 (1, 0) -> (1, 30) projected
  point P0 (0, 0)
  dimension "d147" = 3.5
  dimension "d148" = 7
  dimension "d149" = 7.5
  dimension "d150" = 18
extrude "Extrusion20" cut sketch "Sketch18" against normal blind 10 contours L0 L1 L2 L3
sketch "Sketch20" plane through (0, 6, 0) normal (0, 1, 0) x (1, 0, 0)
  circle A0 centre (-58.25, 33.5) radius 1.55 projected
  circle A1 centre (-4, 33.5) radius 1.55 projected
  circle A2 centre (-4, -3.5) radius 1.55 projected
  circle A3 centre (-58.25, -3.5) radius 1.55 projected
  circle A4 centre (-58.25, 33.5) radius 1.35
  circle A5 centre (-4, 33.5) radius 1.35
  circle A6 centre (-58.25, -3.5) radius 1.35
  circle A7 centre (-4, -3.5) radius 1.35
  point P0 (0, 0)
  dimension "d153" = 2.7
  dimension "d154" = 2.7
  dimension "d155" = 2.7
  dimension "d156" = 2.7
extrude "Extrusion21" add sketch "Sketch20" against normal up to surface (7 mm away)
properties part number "frontpackCOVER2"
